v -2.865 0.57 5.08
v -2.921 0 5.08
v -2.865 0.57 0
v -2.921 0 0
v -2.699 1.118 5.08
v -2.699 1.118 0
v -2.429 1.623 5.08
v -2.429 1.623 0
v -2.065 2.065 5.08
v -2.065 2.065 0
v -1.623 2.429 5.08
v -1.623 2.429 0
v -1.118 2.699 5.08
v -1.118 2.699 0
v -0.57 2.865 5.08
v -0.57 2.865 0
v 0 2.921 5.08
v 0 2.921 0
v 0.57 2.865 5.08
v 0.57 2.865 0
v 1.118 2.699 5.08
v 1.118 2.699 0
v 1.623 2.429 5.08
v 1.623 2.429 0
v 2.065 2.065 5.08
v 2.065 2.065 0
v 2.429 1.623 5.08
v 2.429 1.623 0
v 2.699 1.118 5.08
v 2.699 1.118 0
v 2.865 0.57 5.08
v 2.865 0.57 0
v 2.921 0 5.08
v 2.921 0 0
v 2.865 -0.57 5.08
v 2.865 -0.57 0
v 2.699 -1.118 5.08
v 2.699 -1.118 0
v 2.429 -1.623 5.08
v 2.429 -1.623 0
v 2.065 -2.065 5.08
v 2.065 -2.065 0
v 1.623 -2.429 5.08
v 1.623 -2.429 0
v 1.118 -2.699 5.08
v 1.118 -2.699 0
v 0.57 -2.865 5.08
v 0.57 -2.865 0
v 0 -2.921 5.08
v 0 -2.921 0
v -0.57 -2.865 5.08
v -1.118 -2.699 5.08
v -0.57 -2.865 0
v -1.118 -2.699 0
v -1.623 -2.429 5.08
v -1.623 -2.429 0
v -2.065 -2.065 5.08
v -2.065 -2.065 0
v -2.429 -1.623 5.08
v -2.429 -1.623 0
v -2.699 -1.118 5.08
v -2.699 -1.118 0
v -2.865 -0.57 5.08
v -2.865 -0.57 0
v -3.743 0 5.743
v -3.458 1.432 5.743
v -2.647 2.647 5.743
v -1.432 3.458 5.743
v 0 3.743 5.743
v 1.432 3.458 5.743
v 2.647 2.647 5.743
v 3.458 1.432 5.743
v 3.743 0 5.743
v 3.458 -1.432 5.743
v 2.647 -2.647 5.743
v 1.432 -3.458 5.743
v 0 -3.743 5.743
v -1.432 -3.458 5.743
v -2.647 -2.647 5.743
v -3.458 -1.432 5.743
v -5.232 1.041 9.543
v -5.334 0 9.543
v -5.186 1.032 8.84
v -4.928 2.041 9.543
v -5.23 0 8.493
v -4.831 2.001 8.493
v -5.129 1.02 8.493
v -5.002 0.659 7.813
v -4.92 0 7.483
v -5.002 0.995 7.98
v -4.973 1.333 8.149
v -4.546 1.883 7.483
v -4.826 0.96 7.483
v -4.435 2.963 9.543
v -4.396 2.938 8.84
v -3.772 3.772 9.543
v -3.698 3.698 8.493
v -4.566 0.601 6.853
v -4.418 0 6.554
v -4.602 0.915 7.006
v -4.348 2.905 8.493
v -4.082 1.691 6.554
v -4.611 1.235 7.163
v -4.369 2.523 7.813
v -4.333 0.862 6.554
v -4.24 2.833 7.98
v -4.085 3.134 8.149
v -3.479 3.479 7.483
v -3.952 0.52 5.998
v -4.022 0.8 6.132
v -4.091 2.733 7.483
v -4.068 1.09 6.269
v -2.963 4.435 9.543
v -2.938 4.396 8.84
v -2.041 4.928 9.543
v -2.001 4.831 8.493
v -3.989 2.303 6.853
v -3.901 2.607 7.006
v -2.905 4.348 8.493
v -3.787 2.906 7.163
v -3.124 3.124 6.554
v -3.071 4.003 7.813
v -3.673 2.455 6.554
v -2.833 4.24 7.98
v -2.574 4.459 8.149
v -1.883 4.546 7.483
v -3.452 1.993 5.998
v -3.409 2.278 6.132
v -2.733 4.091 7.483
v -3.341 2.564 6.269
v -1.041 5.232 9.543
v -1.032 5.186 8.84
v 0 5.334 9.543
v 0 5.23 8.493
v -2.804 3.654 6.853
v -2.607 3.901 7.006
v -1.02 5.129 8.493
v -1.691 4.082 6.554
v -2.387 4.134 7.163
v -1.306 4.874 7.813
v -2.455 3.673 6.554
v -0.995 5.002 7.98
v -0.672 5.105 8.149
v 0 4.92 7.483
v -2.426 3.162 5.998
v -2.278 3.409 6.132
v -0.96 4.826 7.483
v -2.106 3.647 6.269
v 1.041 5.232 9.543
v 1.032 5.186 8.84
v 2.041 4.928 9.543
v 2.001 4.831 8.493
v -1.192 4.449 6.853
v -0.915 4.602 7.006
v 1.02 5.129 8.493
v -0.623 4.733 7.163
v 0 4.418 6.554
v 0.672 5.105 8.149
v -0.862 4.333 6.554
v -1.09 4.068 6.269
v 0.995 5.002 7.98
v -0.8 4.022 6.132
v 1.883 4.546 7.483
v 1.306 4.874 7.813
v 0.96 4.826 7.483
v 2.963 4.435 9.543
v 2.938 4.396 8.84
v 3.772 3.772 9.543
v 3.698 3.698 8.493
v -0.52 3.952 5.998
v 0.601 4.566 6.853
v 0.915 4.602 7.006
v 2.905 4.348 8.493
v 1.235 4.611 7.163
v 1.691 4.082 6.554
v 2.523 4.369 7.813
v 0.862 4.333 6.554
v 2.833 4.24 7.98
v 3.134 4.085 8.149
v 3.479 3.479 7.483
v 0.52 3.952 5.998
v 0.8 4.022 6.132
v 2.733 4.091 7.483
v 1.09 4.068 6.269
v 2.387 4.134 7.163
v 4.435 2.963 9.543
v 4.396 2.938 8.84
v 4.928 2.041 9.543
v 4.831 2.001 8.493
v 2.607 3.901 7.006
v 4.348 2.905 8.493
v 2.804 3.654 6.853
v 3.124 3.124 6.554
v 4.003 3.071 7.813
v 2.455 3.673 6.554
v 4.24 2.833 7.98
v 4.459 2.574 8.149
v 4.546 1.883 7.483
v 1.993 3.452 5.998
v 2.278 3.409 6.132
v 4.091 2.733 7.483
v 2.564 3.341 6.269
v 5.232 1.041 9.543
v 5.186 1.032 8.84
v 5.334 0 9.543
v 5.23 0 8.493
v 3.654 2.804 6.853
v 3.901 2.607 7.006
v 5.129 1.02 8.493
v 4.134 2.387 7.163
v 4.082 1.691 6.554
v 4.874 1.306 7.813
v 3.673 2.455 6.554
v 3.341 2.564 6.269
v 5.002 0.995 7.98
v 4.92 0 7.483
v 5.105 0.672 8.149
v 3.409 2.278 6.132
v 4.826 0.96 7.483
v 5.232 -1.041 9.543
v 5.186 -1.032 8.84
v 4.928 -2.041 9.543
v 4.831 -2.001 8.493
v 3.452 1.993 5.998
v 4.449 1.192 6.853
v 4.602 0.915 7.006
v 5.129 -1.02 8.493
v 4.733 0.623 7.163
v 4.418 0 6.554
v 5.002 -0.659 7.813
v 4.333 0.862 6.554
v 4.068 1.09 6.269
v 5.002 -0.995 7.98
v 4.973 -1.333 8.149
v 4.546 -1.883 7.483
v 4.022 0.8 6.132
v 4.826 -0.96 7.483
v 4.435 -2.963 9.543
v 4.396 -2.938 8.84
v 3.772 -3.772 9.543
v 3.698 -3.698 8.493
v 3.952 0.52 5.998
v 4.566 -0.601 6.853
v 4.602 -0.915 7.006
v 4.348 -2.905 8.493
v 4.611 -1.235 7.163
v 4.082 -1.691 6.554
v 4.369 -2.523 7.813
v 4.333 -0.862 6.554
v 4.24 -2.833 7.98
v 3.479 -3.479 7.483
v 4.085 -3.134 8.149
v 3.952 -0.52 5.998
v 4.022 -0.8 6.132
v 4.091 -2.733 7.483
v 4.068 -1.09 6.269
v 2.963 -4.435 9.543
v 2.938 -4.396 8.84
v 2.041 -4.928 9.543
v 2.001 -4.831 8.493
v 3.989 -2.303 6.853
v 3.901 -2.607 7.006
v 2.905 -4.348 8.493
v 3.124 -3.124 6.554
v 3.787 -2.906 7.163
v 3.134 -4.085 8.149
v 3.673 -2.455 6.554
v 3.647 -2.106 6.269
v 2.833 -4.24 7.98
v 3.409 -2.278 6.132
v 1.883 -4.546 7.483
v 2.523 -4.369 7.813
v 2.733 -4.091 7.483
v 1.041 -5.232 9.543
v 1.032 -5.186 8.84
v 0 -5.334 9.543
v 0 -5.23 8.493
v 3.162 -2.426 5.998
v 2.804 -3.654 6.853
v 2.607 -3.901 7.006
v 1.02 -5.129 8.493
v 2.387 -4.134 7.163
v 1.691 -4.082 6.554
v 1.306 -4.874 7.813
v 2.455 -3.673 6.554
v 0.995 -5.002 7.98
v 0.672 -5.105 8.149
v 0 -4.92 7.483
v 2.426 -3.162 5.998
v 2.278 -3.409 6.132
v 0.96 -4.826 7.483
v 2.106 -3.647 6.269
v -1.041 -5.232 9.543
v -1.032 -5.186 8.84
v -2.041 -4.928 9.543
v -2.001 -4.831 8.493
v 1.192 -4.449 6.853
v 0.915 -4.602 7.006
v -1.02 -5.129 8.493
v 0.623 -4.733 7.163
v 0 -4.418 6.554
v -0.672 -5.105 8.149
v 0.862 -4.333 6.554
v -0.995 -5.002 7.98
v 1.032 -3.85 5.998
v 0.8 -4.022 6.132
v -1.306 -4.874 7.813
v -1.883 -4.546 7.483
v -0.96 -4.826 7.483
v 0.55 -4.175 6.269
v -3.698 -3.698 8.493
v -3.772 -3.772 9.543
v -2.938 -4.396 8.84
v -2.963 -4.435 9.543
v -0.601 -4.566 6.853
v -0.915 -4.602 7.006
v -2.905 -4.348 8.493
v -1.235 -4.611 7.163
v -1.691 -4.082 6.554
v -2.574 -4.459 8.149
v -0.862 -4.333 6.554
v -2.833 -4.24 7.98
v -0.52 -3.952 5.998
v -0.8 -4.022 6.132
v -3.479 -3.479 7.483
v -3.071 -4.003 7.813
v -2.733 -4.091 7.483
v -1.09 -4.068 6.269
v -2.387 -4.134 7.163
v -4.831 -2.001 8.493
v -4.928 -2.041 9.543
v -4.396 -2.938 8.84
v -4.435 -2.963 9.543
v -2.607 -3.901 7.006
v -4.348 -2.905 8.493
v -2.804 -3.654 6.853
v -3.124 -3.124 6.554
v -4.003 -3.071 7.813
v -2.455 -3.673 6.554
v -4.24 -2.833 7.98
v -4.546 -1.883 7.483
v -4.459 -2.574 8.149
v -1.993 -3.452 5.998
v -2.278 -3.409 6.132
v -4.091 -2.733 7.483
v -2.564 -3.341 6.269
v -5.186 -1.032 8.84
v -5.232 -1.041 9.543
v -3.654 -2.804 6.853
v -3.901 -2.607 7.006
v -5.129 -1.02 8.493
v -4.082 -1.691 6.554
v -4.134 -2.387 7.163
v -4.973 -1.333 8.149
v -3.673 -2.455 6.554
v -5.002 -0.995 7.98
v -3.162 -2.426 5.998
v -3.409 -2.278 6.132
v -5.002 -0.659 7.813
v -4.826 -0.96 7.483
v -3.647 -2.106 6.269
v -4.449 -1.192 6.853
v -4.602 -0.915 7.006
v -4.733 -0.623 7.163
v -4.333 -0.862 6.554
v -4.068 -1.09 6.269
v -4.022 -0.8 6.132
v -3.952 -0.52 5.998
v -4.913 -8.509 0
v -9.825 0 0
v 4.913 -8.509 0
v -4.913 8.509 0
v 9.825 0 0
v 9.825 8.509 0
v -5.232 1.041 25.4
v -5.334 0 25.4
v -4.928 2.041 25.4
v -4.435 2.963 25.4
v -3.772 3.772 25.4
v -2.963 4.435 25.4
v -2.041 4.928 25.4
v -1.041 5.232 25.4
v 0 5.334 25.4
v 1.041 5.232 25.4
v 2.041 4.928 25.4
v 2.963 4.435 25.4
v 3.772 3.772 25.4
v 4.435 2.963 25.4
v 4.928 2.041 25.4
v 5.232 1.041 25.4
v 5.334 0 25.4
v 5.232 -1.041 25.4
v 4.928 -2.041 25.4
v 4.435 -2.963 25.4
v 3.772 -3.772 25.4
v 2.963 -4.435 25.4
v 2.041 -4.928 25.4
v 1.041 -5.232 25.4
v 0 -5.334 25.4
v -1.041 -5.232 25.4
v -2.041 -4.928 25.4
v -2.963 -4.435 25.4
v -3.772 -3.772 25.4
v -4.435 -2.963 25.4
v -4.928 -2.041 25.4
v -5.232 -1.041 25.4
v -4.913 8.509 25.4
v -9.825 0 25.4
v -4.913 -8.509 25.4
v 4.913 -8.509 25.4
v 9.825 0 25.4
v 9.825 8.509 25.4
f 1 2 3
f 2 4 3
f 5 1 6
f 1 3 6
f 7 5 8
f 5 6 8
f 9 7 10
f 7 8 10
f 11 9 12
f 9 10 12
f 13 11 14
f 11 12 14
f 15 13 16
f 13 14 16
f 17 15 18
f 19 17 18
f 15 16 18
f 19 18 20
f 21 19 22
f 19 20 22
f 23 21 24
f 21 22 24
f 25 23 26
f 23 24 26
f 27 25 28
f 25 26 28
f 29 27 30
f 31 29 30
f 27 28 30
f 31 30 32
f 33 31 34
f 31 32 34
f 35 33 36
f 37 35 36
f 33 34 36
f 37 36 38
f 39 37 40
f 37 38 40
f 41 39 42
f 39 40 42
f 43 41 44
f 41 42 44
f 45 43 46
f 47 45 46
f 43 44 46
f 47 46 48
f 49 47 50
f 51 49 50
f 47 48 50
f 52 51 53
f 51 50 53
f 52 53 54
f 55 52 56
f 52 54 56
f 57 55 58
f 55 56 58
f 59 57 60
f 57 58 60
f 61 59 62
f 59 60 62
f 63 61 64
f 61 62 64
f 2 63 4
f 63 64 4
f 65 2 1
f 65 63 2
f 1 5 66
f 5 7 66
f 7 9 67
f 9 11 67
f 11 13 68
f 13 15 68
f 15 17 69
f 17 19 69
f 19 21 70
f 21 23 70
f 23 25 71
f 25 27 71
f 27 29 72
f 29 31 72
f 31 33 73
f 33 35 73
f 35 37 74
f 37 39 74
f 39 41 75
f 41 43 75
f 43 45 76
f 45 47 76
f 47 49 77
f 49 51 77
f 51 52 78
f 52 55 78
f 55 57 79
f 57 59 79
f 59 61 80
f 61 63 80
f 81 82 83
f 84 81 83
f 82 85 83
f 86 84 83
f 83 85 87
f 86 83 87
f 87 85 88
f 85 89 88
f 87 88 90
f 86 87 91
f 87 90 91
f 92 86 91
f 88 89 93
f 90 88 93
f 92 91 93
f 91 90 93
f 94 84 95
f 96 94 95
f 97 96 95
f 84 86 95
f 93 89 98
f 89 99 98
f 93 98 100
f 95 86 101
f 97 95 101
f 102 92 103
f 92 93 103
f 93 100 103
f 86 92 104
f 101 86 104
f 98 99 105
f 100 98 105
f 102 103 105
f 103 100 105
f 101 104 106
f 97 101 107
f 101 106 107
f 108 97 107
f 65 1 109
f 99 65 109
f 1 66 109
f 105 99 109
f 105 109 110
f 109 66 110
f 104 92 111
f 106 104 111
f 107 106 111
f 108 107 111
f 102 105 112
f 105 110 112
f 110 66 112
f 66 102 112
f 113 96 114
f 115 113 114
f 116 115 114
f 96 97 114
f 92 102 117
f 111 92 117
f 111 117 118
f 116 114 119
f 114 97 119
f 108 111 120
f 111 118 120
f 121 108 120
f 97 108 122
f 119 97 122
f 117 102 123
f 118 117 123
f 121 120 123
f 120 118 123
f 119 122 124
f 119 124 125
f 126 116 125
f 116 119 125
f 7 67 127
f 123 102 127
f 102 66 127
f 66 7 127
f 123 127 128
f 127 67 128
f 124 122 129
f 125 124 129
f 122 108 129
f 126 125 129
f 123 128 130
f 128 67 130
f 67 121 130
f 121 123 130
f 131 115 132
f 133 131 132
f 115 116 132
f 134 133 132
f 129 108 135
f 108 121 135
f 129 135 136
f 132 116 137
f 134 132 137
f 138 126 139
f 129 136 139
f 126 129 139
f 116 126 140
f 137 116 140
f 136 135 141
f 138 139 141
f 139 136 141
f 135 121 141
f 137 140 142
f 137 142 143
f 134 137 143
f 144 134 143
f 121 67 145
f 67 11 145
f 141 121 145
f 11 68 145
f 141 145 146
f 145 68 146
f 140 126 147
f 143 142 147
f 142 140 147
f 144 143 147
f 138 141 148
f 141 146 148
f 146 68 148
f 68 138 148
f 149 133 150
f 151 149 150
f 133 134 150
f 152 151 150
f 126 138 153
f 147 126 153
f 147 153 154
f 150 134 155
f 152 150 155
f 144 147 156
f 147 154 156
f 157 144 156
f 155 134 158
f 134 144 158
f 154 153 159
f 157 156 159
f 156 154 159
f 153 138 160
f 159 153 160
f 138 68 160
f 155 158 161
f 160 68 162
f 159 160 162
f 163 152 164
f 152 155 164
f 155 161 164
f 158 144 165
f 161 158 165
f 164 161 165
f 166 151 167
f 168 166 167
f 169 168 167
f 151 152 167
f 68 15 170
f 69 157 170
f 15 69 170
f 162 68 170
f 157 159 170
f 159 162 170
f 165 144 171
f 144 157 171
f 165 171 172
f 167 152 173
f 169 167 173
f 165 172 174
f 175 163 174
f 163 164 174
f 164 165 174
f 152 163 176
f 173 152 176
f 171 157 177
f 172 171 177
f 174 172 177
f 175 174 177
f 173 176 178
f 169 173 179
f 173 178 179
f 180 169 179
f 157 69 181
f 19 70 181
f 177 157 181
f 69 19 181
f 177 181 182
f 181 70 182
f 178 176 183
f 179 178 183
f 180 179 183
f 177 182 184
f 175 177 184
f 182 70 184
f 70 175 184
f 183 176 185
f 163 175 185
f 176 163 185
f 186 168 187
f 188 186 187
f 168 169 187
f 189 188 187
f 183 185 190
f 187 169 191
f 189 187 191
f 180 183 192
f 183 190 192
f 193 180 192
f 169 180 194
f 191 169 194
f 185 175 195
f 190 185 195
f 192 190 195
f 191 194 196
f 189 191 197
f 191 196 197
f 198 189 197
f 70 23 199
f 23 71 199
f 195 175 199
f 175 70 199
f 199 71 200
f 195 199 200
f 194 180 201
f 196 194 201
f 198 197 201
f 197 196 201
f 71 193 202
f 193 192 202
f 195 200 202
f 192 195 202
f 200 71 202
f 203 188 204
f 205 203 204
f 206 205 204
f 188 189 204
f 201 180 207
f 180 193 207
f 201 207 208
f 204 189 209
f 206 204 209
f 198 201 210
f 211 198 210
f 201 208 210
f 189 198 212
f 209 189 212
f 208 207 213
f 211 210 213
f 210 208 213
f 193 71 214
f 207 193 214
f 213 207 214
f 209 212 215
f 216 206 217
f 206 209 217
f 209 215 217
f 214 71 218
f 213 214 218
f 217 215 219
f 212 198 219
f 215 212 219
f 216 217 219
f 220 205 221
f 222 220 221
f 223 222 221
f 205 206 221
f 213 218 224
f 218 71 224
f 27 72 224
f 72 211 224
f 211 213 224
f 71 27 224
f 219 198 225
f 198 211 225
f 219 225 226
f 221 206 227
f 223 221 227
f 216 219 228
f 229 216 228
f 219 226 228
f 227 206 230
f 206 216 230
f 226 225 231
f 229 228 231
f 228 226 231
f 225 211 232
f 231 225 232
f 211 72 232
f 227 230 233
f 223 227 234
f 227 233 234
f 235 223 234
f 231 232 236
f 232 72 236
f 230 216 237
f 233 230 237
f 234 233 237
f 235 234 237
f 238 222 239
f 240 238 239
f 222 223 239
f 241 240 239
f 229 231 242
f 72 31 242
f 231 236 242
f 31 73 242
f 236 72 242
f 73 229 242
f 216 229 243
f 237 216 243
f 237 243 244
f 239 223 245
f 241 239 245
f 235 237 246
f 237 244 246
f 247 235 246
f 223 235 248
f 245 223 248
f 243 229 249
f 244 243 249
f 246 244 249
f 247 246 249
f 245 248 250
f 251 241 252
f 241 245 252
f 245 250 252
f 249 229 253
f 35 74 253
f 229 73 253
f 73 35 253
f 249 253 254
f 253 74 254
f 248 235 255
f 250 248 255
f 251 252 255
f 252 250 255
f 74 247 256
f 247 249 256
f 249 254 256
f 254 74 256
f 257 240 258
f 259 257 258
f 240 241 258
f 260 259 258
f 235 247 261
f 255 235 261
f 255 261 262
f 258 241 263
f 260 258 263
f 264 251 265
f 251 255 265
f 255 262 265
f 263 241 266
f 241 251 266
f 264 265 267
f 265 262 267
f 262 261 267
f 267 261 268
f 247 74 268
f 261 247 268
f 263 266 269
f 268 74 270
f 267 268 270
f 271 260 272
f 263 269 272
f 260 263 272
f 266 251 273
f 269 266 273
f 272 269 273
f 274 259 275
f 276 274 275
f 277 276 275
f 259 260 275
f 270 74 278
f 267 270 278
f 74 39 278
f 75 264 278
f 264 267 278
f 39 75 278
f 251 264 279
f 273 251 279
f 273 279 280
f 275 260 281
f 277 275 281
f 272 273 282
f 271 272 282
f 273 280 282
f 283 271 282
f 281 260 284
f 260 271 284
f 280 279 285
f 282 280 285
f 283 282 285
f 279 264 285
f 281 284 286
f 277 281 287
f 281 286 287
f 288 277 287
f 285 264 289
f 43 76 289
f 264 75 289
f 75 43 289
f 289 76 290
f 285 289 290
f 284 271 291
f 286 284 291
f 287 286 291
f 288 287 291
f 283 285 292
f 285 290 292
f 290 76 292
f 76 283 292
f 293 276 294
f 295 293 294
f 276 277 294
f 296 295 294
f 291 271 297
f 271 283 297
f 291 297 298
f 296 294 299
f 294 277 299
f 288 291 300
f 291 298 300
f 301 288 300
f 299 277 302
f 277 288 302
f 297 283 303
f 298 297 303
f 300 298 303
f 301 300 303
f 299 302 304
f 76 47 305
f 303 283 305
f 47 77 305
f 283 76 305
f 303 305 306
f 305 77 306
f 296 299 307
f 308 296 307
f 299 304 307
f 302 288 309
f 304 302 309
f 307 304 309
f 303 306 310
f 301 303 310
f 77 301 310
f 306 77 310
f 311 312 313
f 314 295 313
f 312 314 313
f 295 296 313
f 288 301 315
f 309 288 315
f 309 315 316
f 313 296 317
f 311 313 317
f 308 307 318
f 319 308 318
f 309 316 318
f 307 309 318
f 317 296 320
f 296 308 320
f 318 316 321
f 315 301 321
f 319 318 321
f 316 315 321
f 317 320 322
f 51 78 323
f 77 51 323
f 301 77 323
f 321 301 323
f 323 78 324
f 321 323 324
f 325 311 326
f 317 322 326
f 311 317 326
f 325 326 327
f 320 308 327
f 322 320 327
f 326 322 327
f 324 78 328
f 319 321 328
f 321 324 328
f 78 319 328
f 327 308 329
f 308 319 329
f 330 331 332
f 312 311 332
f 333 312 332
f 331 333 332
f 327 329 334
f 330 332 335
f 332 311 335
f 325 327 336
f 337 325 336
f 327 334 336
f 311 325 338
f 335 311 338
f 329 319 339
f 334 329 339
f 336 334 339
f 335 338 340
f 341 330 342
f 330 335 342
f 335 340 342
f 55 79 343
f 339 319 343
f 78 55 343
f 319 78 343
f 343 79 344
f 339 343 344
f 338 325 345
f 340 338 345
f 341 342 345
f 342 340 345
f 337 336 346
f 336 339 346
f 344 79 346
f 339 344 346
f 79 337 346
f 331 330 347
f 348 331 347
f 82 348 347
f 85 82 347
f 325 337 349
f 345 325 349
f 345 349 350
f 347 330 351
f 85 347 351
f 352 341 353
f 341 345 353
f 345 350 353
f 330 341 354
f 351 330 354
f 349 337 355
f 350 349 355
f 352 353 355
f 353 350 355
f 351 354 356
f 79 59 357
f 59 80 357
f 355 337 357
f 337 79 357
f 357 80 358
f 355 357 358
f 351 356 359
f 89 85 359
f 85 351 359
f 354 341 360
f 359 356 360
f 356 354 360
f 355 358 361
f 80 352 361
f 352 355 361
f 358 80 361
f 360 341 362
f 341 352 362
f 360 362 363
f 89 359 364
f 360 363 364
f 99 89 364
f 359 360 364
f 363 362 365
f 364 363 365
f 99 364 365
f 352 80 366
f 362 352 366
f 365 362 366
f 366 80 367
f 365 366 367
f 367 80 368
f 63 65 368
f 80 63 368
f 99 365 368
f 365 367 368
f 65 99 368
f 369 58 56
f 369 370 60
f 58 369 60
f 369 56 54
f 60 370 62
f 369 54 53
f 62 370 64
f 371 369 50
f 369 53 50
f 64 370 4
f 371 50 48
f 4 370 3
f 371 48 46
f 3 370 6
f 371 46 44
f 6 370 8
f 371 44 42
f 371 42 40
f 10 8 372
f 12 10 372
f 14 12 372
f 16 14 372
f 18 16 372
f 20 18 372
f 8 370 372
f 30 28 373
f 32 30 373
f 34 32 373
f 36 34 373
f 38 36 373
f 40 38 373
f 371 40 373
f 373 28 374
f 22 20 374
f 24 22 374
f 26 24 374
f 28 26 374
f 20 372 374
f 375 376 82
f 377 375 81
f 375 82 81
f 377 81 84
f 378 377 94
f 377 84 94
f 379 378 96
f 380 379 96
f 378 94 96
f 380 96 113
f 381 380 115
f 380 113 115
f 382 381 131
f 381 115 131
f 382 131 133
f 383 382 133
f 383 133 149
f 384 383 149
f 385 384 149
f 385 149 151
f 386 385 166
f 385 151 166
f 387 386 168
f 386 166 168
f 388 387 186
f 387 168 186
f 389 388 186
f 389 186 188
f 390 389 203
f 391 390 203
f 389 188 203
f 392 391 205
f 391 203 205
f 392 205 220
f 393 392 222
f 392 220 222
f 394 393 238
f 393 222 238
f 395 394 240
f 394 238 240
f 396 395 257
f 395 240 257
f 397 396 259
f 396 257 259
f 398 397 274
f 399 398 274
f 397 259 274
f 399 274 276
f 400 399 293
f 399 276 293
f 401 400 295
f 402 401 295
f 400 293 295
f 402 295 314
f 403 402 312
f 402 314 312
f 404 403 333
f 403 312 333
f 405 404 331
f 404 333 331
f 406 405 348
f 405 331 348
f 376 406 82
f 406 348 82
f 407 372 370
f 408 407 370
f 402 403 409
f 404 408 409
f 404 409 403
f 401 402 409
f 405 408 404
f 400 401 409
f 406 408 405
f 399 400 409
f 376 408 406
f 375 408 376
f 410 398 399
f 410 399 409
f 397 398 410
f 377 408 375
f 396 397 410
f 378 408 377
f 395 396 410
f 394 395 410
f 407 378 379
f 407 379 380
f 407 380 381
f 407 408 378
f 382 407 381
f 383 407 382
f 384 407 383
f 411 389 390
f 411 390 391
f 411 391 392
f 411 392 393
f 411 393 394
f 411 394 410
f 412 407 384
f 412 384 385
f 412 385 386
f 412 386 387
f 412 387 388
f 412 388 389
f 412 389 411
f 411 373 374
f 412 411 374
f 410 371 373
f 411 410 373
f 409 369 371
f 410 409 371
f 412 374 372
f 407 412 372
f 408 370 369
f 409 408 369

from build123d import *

# Parameters (mm, degrees)
F0_R     = 5.334
F1_DEPTH = 25.4


with BuildPart() as f1:
    # F0 (on Top) → F1 (new body)
    with BuildSketch(Plane.XY):
        Polygon((4.912673, 8.509), (-4.912673, 8.509), (-9.825347, 0), (-4.912673, -8.509), (4.912673, -8.509), (9.825347, 0), align=None)
        Circle(F0_R, mode=Mode.SUBTRACT)
        Polygon((9.825347, 8.509), (4.912673, 8.509), (9.825347, 0), align=None)
        Circle(F0_R)
    extrude(amount=F1_DEPTH)

    # F2 (on Front) → F3 (revolve, cut)
    with BuildSketch(Plane.XZ):
        with BuildLine():
            Line((-2.921, 5.08), (-2.921, 0))
            Line((-2.921, 0), (0, 0))
            Line((0, 0), (0, 28.878784))
            Line((0, 28.878784), (-5.334, 28.878784))
            Line((-5.334, 28.878784), (-5.334, 9.543106))
            ThreePointArc((-5.334, 9.543106), (-4.69213, 7.006283), (-2.921, 5.08))
        make_face()
    revolve(axis=Axis((0, 0, 14.439392), (0, 0, -1)), mode=Mode.SUBTRACT)


solid = f1.part
